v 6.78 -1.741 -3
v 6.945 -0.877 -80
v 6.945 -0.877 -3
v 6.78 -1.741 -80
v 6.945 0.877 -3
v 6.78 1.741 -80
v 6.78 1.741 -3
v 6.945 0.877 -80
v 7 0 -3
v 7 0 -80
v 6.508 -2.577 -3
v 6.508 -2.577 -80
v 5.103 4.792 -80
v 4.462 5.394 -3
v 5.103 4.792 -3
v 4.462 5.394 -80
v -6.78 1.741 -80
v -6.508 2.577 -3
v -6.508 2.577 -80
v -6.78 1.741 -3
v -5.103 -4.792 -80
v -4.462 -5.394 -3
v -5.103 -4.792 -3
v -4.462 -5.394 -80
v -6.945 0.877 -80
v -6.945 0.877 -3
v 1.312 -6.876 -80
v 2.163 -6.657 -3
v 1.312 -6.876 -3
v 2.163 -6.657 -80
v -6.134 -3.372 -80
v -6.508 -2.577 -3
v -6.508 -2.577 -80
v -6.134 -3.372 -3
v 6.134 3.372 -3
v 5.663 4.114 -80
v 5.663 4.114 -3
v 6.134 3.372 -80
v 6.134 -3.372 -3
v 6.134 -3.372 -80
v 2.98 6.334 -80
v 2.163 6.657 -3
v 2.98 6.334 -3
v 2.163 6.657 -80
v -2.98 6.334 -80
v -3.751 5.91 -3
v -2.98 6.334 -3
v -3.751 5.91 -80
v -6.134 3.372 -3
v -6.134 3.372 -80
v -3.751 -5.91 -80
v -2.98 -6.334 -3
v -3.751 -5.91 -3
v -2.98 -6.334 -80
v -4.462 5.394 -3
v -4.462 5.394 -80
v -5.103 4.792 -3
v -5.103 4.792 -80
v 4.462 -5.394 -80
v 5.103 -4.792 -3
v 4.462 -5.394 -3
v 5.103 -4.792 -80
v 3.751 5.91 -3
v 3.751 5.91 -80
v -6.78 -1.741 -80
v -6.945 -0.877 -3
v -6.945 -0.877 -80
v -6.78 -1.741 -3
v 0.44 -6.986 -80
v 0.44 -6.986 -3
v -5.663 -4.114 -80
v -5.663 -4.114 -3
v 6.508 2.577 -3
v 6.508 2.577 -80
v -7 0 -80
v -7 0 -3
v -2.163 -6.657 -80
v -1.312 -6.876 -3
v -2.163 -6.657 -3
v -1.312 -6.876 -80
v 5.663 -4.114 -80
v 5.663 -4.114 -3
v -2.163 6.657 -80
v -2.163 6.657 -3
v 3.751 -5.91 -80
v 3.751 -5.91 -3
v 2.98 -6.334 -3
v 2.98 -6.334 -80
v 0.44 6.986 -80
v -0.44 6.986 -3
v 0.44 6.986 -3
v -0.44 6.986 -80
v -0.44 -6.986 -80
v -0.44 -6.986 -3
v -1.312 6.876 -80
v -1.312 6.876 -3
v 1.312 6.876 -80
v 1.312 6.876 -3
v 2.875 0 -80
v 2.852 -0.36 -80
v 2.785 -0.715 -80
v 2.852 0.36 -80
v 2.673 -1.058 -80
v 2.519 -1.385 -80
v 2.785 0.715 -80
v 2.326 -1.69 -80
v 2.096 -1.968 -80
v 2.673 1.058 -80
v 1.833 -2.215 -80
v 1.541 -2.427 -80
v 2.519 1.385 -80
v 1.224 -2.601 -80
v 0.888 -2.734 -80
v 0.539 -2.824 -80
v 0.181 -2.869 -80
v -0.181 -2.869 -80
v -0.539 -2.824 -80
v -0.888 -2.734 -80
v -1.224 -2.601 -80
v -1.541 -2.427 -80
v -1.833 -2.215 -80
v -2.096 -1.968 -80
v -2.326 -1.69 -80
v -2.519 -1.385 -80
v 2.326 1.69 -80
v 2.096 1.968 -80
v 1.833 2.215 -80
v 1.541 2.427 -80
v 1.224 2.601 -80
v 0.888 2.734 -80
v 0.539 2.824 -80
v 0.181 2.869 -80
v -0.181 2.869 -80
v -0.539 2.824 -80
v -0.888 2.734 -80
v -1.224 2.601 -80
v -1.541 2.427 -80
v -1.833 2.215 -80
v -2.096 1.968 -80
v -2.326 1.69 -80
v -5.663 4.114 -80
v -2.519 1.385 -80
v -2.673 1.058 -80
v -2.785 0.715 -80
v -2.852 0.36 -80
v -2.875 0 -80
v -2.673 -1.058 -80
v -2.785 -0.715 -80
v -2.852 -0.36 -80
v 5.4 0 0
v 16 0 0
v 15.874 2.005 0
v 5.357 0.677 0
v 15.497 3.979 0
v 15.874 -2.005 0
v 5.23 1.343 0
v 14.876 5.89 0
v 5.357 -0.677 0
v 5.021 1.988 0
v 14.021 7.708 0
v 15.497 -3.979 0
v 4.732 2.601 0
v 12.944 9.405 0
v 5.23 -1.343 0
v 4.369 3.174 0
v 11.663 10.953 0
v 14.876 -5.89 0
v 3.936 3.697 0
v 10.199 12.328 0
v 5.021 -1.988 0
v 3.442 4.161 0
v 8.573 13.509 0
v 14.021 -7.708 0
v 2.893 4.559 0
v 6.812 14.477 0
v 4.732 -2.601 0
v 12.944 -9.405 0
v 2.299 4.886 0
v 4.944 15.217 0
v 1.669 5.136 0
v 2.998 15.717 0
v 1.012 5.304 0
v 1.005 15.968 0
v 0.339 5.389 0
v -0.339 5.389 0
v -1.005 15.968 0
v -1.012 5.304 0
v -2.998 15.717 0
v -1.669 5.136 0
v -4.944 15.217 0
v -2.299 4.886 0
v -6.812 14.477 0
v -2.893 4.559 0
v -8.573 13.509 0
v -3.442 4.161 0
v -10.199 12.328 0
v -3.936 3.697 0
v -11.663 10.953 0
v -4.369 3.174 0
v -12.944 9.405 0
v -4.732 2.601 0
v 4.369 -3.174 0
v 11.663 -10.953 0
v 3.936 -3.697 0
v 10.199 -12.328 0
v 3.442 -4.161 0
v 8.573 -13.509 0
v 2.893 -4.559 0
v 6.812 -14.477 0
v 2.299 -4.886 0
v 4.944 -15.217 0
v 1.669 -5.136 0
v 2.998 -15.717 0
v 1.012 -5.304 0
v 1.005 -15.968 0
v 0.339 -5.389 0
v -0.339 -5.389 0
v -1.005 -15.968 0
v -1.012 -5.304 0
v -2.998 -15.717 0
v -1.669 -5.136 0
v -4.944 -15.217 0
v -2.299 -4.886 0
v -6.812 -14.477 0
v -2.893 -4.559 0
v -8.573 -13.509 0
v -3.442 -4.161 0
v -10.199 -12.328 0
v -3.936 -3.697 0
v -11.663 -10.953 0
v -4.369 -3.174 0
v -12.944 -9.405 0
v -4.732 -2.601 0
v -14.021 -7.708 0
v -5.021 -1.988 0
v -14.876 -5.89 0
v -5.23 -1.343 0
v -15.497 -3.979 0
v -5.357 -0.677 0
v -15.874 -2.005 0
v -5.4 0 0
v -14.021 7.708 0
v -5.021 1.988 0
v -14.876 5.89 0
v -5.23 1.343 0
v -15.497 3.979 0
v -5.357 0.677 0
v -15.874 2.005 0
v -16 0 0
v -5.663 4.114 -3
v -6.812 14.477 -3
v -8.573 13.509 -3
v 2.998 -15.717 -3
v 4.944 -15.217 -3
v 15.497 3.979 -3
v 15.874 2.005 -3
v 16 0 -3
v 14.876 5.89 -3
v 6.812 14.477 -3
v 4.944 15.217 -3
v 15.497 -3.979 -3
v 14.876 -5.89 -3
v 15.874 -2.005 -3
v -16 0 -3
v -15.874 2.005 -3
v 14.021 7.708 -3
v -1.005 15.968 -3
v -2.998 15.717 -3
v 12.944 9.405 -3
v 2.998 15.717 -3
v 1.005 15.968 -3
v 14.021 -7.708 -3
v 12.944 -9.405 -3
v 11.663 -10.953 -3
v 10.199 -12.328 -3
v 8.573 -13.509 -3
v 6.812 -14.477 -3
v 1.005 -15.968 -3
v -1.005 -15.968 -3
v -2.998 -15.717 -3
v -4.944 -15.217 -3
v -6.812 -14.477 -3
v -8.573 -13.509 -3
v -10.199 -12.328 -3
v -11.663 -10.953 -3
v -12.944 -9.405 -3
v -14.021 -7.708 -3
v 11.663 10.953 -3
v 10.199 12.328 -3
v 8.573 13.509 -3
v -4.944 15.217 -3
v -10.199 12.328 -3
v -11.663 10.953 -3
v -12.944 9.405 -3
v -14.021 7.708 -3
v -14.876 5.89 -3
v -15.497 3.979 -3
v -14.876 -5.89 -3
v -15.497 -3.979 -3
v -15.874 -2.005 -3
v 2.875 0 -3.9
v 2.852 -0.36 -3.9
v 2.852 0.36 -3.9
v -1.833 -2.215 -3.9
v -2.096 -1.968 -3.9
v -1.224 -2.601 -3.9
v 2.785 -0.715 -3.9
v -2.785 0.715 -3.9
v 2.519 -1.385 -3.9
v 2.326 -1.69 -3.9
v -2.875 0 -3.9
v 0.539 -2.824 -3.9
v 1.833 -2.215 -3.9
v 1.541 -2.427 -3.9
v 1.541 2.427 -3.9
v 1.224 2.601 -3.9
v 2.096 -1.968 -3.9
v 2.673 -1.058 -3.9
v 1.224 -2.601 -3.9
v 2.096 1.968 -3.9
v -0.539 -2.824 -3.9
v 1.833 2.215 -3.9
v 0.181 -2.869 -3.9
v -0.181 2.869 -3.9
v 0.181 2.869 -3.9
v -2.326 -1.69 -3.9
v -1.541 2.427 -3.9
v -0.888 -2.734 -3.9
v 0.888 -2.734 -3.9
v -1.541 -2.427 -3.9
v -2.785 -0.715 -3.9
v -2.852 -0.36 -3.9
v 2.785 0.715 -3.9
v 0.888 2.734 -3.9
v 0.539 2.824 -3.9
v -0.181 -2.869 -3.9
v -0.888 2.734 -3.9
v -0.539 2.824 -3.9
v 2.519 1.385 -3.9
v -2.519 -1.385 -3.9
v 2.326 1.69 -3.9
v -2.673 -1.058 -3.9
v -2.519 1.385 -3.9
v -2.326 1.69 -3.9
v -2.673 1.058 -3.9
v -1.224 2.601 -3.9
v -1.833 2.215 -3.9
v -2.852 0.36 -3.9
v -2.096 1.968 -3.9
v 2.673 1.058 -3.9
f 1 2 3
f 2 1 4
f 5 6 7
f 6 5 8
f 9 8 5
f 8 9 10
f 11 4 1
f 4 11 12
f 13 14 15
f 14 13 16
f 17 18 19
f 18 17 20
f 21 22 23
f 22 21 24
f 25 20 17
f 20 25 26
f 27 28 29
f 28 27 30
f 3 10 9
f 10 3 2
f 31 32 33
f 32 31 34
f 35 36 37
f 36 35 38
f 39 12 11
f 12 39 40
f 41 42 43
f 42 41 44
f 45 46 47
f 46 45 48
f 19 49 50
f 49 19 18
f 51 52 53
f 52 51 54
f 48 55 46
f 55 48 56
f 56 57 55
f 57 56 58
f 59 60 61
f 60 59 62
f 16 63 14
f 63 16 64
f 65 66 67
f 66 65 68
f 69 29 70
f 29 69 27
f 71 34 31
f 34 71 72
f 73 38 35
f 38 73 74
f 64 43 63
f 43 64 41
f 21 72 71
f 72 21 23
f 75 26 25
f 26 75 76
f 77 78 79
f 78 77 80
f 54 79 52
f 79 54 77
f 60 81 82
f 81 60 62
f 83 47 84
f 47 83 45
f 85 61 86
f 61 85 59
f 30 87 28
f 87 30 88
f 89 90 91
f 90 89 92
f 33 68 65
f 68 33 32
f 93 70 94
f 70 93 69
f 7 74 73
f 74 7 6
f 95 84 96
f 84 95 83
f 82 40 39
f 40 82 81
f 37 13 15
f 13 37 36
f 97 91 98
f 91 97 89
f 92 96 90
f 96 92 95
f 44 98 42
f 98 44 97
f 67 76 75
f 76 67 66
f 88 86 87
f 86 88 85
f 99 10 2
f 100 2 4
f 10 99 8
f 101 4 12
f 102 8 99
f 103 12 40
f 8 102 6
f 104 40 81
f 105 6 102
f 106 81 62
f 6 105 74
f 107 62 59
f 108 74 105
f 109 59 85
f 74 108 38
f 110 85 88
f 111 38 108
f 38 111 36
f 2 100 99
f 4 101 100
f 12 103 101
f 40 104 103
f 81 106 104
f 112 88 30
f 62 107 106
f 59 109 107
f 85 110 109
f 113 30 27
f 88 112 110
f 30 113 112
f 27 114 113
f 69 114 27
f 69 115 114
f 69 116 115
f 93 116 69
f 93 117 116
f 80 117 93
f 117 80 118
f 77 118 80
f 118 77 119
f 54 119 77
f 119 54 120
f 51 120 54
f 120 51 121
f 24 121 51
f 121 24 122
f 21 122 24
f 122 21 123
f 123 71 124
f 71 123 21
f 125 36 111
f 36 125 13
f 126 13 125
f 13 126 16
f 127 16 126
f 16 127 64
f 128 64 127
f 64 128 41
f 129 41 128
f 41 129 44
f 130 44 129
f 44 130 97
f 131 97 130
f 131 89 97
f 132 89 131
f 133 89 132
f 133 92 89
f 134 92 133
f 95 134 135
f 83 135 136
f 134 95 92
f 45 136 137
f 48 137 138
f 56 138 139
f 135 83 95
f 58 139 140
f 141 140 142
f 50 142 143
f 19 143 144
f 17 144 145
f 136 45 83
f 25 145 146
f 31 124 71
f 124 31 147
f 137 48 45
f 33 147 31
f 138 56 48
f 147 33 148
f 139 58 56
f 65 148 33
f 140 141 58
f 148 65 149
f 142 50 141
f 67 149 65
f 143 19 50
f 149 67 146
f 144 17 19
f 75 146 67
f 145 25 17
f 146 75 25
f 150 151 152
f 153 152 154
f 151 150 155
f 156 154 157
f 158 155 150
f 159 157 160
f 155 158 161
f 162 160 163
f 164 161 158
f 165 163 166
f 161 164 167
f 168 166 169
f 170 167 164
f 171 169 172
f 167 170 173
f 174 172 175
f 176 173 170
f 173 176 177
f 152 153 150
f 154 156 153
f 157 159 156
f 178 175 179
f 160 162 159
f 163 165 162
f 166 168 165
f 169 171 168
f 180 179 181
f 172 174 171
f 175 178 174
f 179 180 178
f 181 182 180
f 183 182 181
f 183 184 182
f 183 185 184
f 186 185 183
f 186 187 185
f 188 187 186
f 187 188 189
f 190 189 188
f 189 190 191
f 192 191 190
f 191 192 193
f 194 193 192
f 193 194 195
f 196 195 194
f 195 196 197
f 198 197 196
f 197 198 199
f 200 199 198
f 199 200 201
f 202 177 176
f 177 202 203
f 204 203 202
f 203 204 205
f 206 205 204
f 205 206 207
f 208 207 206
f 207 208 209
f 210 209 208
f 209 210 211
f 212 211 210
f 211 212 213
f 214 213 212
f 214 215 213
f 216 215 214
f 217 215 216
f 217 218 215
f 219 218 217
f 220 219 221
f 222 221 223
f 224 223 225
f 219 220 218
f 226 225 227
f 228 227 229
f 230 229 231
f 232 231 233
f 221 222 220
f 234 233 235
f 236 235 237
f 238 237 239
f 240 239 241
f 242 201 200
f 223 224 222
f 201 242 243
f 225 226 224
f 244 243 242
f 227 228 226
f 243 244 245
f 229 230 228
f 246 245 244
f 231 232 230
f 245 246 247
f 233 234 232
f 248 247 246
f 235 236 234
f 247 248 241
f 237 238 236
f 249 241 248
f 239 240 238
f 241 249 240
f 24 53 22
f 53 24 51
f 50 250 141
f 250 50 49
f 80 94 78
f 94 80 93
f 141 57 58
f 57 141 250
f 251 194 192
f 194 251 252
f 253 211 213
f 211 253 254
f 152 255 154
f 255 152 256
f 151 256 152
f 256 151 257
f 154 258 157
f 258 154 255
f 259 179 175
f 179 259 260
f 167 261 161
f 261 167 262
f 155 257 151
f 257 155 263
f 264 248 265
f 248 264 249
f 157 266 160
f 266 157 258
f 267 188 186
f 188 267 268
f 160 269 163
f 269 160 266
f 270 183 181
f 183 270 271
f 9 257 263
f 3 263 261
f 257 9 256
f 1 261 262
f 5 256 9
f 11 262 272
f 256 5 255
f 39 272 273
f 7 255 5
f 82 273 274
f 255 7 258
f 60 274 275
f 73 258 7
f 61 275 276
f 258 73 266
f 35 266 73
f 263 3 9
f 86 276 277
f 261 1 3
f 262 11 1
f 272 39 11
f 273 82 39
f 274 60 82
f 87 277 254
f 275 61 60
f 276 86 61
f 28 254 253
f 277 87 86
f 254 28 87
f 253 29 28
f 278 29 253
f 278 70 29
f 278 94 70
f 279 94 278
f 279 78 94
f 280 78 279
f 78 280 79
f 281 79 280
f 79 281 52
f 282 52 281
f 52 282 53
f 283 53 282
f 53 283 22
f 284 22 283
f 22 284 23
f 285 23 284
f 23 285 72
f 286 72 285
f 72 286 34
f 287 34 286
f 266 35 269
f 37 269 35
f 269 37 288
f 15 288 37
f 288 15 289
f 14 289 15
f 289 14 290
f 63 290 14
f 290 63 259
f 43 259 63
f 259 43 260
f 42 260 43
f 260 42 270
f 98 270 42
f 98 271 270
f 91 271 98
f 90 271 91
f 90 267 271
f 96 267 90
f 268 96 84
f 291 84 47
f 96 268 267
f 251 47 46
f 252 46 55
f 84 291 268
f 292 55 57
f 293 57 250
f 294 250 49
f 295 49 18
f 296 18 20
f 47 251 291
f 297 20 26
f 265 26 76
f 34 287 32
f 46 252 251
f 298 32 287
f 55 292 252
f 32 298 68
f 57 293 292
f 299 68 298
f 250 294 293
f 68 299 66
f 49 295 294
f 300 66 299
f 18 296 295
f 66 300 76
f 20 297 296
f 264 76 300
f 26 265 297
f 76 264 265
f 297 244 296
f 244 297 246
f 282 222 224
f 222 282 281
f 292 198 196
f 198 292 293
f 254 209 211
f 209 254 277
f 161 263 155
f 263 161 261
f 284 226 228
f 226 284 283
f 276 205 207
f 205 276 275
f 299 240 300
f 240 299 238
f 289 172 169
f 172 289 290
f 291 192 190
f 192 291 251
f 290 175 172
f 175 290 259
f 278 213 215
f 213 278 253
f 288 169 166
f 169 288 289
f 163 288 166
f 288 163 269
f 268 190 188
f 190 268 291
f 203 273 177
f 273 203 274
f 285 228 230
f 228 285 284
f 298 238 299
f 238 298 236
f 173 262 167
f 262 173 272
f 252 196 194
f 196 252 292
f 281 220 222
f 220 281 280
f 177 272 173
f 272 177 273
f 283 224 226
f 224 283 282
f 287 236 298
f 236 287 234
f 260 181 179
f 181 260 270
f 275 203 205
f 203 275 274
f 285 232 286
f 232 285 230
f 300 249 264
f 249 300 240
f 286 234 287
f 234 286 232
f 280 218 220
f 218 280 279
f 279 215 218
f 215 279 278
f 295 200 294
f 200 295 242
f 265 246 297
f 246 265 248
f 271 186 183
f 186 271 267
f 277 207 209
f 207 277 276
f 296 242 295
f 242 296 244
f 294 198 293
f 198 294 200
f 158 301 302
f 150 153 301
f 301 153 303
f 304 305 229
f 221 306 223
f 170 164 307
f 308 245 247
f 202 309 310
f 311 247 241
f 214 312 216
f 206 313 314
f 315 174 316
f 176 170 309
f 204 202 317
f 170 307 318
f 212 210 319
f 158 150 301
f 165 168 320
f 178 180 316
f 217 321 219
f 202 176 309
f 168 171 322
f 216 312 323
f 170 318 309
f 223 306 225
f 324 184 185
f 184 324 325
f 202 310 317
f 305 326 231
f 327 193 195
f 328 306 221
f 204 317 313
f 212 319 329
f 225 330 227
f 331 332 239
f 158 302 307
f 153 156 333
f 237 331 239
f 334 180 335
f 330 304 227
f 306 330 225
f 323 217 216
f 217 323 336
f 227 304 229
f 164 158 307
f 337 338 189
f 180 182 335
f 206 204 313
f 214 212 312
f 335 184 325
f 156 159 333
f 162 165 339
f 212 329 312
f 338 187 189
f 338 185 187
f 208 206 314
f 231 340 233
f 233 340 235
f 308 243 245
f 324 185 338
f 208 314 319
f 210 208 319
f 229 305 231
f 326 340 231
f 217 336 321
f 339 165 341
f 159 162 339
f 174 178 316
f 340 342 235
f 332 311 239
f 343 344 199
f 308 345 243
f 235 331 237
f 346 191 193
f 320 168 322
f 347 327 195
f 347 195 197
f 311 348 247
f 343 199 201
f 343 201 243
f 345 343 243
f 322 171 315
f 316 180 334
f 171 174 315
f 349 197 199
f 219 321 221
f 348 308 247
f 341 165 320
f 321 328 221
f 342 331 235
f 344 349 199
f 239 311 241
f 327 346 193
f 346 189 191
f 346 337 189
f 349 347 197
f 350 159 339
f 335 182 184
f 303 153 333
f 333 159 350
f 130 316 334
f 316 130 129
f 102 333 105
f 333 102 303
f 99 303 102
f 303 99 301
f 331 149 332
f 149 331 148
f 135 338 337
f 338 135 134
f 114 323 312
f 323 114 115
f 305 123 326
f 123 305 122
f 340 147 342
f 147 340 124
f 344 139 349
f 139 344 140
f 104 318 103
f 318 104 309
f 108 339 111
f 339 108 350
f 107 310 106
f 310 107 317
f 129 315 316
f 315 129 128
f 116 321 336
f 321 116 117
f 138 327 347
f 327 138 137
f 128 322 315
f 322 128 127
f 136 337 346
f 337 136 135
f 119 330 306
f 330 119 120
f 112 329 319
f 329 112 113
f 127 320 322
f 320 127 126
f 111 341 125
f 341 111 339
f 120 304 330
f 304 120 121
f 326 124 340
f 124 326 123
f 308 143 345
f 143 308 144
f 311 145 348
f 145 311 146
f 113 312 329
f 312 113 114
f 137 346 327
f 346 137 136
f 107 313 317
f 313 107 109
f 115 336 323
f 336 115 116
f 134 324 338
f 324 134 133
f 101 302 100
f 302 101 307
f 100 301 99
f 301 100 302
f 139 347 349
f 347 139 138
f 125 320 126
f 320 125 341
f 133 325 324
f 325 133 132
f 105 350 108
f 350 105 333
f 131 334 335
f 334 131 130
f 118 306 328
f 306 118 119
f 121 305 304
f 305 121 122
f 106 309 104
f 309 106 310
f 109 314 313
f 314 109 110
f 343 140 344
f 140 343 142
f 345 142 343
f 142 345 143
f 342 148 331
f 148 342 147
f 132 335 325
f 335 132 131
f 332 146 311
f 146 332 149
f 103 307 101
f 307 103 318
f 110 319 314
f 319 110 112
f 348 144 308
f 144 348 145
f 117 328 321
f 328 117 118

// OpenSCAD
$fn = 50;


difference() {
	union() {
		translate(v = [0, 0, -80.0000000000]) {
			cylinder(h = 80, r = 7.0000000000);
		}
		translate(v = [0, 0, -3.0000000000]) {
			cylinder(h = 3, r = 16.0000000000);
		}
	}
	union() {
		translate(v = [0, 0, 0]) {
			rotate(a = [0, 0, 0]) {
				difference() {
					union() {
						#translate(v = [0, 0, -80.0000000000]) {
							cylinder(h = 80, r = 2.6000000000);
						}
						#translate(v = [0, 0, -3.9000000000]) {
							cylinder(h = 3.9000000000, r = 7.0000000000, r1 = 2.8750000000, r2 = 5.4000000000);
						}
						#translate(v = [0, 0, -80.0000000000]) {
							cylinder(h = 80, r = 2.8750000000);
						}
						#translate(v = [0, 0, -80.0000000000]) {
							cylinder(h = 80, r = 2.6000000000);
						}
					}
					union();
				}
			}
		}
	}
}
